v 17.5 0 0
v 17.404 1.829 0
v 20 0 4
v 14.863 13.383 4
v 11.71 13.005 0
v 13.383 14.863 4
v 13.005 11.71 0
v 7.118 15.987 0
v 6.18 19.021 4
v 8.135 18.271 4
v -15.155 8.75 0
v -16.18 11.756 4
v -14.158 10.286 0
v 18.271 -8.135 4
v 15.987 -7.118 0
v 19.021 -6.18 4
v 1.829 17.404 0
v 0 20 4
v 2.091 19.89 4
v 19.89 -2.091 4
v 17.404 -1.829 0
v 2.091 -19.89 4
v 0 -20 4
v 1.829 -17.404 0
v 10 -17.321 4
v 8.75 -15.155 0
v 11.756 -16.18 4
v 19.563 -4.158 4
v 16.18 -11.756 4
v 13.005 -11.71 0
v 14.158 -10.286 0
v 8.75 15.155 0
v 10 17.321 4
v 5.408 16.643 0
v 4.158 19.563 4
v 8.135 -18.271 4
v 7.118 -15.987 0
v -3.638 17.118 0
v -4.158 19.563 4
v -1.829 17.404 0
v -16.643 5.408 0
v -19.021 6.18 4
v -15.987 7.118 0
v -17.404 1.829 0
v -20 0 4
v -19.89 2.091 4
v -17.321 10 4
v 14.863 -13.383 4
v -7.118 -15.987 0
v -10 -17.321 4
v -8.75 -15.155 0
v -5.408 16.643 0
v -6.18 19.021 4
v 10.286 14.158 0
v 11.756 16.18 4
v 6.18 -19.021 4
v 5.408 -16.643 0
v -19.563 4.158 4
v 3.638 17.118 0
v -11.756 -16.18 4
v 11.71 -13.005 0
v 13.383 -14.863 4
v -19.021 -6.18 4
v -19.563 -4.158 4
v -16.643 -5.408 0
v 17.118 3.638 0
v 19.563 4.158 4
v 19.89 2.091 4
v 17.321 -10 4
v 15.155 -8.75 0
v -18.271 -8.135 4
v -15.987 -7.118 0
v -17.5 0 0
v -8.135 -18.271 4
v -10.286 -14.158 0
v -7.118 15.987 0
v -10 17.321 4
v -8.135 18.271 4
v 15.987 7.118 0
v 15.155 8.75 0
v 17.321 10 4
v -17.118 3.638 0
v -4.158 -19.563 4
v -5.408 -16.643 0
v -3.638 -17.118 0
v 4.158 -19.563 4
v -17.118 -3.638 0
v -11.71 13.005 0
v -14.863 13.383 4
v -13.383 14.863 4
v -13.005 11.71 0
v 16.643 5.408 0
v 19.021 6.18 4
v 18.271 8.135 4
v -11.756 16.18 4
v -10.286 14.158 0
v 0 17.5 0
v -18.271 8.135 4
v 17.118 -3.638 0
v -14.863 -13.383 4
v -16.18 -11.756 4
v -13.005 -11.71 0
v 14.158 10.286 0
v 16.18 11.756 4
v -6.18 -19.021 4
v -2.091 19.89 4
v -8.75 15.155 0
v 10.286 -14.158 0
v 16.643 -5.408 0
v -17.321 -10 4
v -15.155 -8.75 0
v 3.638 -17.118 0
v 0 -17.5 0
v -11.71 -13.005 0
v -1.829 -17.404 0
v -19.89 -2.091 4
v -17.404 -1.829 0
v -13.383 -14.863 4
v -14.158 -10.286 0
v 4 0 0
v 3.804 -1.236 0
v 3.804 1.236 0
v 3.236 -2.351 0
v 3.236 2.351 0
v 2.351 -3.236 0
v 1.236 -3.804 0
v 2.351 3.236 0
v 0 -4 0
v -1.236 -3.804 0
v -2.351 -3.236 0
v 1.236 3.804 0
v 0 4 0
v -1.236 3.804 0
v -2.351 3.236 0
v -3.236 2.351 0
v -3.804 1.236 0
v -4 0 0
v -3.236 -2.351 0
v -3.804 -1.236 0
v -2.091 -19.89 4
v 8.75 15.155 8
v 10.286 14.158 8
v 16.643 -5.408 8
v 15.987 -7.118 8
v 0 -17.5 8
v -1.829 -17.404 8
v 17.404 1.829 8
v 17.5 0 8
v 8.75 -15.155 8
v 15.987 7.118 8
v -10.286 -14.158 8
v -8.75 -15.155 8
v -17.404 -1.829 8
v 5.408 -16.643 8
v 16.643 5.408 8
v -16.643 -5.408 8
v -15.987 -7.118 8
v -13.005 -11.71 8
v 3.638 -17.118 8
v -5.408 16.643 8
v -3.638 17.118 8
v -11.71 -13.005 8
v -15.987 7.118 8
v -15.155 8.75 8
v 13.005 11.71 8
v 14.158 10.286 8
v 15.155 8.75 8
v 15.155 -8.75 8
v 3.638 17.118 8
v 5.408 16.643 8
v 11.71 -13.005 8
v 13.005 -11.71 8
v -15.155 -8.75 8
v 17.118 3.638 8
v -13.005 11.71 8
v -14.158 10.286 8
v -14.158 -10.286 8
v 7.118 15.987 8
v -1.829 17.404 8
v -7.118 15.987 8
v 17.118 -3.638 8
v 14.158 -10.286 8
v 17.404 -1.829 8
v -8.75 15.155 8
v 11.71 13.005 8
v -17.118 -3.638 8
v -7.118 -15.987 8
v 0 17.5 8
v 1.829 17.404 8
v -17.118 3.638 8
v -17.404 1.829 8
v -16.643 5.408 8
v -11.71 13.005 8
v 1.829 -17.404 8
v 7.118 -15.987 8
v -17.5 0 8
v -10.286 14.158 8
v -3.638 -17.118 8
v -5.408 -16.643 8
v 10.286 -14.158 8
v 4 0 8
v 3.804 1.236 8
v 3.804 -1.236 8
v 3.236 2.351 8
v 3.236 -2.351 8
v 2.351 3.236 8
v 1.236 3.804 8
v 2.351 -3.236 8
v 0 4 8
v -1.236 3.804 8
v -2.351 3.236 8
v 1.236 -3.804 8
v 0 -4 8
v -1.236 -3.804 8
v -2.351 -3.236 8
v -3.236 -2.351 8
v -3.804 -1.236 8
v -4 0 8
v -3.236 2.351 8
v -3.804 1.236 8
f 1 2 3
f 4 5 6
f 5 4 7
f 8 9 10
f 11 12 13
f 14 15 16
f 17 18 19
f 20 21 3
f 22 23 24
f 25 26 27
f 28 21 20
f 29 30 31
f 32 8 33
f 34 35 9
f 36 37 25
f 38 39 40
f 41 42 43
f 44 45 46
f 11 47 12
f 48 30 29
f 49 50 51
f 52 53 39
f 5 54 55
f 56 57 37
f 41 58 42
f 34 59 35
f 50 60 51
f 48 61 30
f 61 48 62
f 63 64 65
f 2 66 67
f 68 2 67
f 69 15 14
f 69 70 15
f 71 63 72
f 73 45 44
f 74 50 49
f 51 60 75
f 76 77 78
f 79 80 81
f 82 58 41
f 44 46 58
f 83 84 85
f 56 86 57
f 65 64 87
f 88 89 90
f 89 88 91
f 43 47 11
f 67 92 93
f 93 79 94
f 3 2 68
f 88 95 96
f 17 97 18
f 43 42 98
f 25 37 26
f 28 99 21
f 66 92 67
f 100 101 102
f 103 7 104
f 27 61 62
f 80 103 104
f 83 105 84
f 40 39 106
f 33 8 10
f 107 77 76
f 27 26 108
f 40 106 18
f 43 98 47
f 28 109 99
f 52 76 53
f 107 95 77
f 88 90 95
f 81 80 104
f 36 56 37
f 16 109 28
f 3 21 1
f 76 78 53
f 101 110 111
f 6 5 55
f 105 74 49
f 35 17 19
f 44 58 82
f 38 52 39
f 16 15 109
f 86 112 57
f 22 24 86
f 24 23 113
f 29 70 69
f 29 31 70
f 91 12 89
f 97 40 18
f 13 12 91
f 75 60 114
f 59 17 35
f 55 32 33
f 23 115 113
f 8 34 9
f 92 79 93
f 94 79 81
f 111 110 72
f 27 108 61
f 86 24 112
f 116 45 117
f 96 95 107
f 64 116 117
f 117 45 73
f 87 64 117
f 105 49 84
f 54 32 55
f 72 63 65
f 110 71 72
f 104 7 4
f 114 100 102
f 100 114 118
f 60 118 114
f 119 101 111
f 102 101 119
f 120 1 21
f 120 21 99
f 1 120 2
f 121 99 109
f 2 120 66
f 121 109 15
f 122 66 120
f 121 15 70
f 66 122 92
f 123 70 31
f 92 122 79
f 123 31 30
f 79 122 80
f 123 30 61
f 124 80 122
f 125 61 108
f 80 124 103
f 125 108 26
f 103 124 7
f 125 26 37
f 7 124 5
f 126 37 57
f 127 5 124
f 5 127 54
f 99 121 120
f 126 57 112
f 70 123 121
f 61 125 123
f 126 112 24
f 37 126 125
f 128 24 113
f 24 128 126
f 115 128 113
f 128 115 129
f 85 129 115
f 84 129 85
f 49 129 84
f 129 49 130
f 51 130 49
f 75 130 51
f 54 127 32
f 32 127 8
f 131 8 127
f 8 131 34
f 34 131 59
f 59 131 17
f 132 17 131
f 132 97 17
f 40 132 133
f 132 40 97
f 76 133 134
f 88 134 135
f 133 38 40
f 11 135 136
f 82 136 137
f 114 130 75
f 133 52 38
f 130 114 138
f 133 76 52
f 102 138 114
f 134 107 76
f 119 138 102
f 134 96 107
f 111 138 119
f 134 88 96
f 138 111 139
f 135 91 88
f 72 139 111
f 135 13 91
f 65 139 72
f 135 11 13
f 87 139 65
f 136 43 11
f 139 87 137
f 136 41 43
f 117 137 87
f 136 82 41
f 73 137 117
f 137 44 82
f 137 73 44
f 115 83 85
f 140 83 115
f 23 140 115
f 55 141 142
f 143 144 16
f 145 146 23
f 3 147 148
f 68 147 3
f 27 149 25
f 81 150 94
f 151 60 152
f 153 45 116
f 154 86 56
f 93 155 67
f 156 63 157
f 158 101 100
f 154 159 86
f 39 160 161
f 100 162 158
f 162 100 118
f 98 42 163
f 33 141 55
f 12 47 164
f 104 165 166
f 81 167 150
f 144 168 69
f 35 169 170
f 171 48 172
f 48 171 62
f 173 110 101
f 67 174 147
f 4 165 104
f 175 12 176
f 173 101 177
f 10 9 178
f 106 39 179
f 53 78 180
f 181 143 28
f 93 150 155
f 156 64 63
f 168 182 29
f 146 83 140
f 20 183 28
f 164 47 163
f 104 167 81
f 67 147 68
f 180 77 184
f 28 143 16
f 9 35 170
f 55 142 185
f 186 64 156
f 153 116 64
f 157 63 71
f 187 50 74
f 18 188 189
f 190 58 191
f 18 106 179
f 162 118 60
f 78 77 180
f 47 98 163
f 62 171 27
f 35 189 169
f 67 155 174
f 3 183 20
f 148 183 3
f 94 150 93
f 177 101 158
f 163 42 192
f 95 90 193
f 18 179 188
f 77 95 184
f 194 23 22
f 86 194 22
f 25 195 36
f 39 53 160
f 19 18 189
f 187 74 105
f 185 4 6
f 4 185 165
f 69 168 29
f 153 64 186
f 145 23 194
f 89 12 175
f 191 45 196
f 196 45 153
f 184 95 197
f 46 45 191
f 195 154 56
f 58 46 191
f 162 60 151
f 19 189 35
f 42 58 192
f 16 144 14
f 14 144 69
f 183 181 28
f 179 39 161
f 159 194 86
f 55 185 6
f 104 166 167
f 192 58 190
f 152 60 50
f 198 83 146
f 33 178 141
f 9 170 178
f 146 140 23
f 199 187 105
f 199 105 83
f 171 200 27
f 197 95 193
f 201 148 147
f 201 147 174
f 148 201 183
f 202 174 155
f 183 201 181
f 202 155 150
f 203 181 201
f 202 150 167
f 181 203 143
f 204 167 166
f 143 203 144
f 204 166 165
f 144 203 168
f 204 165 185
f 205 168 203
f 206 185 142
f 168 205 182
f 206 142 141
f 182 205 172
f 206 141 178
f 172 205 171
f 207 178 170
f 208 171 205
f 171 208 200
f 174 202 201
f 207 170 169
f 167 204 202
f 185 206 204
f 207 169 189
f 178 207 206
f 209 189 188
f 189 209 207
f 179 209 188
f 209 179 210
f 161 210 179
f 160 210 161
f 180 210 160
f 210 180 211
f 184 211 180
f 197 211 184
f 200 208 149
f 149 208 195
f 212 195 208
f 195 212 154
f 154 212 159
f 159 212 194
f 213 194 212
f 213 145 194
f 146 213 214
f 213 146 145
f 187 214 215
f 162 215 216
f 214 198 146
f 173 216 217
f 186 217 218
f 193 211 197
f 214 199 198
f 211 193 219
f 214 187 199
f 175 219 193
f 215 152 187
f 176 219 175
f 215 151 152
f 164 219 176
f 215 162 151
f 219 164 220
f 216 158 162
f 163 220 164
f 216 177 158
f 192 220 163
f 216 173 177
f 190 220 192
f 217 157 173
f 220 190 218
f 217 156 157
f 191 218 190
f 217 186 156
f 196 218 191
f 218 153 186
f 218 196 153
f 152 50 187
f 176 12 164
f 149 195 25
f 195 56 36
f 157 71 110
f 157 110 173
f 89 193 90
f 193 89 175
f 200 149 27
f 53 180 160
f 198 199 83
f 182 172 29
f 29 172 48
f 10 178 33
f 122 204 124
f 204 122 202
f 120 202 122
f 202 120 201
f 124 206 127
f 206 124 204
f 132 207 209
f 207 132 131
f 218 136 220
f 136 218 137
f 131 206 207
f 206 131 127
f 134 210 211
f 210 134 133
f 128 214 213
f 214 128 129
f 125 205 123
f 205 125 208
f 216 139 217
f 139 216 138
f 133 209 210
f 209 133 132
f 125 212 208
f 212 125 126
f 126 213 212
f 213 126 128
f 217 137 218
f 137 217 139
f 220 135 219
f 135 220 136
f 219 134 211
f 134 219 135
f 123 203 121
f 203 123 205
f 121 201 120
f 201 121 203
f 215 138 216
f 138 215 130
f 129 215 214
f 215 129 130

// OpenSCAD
/* [Global] */

//Thickness of the roller
thickness = 8; //[1:100]

//Larger diameter of the wheel
large_dia=40;

//Smaller diameter of the wheel
small_dia=35;

//Mounting bolt diameter
bolt_size=8;

difference()
{
	union()
	{
		cylinder(h=thickness/2, r1=small_dia/2, r2=large_dia/2, center=false, $fn=60);
		translate([0,0,thickness/2]) cylinder(h=thickness/2, r1=large_dia/2, r2=small_dia/2, center=false, $fn=60);
	}
	union()
	{
		cylinder(h=thickness, r=bolt_size/2, $fn=20);
	}
}
	
